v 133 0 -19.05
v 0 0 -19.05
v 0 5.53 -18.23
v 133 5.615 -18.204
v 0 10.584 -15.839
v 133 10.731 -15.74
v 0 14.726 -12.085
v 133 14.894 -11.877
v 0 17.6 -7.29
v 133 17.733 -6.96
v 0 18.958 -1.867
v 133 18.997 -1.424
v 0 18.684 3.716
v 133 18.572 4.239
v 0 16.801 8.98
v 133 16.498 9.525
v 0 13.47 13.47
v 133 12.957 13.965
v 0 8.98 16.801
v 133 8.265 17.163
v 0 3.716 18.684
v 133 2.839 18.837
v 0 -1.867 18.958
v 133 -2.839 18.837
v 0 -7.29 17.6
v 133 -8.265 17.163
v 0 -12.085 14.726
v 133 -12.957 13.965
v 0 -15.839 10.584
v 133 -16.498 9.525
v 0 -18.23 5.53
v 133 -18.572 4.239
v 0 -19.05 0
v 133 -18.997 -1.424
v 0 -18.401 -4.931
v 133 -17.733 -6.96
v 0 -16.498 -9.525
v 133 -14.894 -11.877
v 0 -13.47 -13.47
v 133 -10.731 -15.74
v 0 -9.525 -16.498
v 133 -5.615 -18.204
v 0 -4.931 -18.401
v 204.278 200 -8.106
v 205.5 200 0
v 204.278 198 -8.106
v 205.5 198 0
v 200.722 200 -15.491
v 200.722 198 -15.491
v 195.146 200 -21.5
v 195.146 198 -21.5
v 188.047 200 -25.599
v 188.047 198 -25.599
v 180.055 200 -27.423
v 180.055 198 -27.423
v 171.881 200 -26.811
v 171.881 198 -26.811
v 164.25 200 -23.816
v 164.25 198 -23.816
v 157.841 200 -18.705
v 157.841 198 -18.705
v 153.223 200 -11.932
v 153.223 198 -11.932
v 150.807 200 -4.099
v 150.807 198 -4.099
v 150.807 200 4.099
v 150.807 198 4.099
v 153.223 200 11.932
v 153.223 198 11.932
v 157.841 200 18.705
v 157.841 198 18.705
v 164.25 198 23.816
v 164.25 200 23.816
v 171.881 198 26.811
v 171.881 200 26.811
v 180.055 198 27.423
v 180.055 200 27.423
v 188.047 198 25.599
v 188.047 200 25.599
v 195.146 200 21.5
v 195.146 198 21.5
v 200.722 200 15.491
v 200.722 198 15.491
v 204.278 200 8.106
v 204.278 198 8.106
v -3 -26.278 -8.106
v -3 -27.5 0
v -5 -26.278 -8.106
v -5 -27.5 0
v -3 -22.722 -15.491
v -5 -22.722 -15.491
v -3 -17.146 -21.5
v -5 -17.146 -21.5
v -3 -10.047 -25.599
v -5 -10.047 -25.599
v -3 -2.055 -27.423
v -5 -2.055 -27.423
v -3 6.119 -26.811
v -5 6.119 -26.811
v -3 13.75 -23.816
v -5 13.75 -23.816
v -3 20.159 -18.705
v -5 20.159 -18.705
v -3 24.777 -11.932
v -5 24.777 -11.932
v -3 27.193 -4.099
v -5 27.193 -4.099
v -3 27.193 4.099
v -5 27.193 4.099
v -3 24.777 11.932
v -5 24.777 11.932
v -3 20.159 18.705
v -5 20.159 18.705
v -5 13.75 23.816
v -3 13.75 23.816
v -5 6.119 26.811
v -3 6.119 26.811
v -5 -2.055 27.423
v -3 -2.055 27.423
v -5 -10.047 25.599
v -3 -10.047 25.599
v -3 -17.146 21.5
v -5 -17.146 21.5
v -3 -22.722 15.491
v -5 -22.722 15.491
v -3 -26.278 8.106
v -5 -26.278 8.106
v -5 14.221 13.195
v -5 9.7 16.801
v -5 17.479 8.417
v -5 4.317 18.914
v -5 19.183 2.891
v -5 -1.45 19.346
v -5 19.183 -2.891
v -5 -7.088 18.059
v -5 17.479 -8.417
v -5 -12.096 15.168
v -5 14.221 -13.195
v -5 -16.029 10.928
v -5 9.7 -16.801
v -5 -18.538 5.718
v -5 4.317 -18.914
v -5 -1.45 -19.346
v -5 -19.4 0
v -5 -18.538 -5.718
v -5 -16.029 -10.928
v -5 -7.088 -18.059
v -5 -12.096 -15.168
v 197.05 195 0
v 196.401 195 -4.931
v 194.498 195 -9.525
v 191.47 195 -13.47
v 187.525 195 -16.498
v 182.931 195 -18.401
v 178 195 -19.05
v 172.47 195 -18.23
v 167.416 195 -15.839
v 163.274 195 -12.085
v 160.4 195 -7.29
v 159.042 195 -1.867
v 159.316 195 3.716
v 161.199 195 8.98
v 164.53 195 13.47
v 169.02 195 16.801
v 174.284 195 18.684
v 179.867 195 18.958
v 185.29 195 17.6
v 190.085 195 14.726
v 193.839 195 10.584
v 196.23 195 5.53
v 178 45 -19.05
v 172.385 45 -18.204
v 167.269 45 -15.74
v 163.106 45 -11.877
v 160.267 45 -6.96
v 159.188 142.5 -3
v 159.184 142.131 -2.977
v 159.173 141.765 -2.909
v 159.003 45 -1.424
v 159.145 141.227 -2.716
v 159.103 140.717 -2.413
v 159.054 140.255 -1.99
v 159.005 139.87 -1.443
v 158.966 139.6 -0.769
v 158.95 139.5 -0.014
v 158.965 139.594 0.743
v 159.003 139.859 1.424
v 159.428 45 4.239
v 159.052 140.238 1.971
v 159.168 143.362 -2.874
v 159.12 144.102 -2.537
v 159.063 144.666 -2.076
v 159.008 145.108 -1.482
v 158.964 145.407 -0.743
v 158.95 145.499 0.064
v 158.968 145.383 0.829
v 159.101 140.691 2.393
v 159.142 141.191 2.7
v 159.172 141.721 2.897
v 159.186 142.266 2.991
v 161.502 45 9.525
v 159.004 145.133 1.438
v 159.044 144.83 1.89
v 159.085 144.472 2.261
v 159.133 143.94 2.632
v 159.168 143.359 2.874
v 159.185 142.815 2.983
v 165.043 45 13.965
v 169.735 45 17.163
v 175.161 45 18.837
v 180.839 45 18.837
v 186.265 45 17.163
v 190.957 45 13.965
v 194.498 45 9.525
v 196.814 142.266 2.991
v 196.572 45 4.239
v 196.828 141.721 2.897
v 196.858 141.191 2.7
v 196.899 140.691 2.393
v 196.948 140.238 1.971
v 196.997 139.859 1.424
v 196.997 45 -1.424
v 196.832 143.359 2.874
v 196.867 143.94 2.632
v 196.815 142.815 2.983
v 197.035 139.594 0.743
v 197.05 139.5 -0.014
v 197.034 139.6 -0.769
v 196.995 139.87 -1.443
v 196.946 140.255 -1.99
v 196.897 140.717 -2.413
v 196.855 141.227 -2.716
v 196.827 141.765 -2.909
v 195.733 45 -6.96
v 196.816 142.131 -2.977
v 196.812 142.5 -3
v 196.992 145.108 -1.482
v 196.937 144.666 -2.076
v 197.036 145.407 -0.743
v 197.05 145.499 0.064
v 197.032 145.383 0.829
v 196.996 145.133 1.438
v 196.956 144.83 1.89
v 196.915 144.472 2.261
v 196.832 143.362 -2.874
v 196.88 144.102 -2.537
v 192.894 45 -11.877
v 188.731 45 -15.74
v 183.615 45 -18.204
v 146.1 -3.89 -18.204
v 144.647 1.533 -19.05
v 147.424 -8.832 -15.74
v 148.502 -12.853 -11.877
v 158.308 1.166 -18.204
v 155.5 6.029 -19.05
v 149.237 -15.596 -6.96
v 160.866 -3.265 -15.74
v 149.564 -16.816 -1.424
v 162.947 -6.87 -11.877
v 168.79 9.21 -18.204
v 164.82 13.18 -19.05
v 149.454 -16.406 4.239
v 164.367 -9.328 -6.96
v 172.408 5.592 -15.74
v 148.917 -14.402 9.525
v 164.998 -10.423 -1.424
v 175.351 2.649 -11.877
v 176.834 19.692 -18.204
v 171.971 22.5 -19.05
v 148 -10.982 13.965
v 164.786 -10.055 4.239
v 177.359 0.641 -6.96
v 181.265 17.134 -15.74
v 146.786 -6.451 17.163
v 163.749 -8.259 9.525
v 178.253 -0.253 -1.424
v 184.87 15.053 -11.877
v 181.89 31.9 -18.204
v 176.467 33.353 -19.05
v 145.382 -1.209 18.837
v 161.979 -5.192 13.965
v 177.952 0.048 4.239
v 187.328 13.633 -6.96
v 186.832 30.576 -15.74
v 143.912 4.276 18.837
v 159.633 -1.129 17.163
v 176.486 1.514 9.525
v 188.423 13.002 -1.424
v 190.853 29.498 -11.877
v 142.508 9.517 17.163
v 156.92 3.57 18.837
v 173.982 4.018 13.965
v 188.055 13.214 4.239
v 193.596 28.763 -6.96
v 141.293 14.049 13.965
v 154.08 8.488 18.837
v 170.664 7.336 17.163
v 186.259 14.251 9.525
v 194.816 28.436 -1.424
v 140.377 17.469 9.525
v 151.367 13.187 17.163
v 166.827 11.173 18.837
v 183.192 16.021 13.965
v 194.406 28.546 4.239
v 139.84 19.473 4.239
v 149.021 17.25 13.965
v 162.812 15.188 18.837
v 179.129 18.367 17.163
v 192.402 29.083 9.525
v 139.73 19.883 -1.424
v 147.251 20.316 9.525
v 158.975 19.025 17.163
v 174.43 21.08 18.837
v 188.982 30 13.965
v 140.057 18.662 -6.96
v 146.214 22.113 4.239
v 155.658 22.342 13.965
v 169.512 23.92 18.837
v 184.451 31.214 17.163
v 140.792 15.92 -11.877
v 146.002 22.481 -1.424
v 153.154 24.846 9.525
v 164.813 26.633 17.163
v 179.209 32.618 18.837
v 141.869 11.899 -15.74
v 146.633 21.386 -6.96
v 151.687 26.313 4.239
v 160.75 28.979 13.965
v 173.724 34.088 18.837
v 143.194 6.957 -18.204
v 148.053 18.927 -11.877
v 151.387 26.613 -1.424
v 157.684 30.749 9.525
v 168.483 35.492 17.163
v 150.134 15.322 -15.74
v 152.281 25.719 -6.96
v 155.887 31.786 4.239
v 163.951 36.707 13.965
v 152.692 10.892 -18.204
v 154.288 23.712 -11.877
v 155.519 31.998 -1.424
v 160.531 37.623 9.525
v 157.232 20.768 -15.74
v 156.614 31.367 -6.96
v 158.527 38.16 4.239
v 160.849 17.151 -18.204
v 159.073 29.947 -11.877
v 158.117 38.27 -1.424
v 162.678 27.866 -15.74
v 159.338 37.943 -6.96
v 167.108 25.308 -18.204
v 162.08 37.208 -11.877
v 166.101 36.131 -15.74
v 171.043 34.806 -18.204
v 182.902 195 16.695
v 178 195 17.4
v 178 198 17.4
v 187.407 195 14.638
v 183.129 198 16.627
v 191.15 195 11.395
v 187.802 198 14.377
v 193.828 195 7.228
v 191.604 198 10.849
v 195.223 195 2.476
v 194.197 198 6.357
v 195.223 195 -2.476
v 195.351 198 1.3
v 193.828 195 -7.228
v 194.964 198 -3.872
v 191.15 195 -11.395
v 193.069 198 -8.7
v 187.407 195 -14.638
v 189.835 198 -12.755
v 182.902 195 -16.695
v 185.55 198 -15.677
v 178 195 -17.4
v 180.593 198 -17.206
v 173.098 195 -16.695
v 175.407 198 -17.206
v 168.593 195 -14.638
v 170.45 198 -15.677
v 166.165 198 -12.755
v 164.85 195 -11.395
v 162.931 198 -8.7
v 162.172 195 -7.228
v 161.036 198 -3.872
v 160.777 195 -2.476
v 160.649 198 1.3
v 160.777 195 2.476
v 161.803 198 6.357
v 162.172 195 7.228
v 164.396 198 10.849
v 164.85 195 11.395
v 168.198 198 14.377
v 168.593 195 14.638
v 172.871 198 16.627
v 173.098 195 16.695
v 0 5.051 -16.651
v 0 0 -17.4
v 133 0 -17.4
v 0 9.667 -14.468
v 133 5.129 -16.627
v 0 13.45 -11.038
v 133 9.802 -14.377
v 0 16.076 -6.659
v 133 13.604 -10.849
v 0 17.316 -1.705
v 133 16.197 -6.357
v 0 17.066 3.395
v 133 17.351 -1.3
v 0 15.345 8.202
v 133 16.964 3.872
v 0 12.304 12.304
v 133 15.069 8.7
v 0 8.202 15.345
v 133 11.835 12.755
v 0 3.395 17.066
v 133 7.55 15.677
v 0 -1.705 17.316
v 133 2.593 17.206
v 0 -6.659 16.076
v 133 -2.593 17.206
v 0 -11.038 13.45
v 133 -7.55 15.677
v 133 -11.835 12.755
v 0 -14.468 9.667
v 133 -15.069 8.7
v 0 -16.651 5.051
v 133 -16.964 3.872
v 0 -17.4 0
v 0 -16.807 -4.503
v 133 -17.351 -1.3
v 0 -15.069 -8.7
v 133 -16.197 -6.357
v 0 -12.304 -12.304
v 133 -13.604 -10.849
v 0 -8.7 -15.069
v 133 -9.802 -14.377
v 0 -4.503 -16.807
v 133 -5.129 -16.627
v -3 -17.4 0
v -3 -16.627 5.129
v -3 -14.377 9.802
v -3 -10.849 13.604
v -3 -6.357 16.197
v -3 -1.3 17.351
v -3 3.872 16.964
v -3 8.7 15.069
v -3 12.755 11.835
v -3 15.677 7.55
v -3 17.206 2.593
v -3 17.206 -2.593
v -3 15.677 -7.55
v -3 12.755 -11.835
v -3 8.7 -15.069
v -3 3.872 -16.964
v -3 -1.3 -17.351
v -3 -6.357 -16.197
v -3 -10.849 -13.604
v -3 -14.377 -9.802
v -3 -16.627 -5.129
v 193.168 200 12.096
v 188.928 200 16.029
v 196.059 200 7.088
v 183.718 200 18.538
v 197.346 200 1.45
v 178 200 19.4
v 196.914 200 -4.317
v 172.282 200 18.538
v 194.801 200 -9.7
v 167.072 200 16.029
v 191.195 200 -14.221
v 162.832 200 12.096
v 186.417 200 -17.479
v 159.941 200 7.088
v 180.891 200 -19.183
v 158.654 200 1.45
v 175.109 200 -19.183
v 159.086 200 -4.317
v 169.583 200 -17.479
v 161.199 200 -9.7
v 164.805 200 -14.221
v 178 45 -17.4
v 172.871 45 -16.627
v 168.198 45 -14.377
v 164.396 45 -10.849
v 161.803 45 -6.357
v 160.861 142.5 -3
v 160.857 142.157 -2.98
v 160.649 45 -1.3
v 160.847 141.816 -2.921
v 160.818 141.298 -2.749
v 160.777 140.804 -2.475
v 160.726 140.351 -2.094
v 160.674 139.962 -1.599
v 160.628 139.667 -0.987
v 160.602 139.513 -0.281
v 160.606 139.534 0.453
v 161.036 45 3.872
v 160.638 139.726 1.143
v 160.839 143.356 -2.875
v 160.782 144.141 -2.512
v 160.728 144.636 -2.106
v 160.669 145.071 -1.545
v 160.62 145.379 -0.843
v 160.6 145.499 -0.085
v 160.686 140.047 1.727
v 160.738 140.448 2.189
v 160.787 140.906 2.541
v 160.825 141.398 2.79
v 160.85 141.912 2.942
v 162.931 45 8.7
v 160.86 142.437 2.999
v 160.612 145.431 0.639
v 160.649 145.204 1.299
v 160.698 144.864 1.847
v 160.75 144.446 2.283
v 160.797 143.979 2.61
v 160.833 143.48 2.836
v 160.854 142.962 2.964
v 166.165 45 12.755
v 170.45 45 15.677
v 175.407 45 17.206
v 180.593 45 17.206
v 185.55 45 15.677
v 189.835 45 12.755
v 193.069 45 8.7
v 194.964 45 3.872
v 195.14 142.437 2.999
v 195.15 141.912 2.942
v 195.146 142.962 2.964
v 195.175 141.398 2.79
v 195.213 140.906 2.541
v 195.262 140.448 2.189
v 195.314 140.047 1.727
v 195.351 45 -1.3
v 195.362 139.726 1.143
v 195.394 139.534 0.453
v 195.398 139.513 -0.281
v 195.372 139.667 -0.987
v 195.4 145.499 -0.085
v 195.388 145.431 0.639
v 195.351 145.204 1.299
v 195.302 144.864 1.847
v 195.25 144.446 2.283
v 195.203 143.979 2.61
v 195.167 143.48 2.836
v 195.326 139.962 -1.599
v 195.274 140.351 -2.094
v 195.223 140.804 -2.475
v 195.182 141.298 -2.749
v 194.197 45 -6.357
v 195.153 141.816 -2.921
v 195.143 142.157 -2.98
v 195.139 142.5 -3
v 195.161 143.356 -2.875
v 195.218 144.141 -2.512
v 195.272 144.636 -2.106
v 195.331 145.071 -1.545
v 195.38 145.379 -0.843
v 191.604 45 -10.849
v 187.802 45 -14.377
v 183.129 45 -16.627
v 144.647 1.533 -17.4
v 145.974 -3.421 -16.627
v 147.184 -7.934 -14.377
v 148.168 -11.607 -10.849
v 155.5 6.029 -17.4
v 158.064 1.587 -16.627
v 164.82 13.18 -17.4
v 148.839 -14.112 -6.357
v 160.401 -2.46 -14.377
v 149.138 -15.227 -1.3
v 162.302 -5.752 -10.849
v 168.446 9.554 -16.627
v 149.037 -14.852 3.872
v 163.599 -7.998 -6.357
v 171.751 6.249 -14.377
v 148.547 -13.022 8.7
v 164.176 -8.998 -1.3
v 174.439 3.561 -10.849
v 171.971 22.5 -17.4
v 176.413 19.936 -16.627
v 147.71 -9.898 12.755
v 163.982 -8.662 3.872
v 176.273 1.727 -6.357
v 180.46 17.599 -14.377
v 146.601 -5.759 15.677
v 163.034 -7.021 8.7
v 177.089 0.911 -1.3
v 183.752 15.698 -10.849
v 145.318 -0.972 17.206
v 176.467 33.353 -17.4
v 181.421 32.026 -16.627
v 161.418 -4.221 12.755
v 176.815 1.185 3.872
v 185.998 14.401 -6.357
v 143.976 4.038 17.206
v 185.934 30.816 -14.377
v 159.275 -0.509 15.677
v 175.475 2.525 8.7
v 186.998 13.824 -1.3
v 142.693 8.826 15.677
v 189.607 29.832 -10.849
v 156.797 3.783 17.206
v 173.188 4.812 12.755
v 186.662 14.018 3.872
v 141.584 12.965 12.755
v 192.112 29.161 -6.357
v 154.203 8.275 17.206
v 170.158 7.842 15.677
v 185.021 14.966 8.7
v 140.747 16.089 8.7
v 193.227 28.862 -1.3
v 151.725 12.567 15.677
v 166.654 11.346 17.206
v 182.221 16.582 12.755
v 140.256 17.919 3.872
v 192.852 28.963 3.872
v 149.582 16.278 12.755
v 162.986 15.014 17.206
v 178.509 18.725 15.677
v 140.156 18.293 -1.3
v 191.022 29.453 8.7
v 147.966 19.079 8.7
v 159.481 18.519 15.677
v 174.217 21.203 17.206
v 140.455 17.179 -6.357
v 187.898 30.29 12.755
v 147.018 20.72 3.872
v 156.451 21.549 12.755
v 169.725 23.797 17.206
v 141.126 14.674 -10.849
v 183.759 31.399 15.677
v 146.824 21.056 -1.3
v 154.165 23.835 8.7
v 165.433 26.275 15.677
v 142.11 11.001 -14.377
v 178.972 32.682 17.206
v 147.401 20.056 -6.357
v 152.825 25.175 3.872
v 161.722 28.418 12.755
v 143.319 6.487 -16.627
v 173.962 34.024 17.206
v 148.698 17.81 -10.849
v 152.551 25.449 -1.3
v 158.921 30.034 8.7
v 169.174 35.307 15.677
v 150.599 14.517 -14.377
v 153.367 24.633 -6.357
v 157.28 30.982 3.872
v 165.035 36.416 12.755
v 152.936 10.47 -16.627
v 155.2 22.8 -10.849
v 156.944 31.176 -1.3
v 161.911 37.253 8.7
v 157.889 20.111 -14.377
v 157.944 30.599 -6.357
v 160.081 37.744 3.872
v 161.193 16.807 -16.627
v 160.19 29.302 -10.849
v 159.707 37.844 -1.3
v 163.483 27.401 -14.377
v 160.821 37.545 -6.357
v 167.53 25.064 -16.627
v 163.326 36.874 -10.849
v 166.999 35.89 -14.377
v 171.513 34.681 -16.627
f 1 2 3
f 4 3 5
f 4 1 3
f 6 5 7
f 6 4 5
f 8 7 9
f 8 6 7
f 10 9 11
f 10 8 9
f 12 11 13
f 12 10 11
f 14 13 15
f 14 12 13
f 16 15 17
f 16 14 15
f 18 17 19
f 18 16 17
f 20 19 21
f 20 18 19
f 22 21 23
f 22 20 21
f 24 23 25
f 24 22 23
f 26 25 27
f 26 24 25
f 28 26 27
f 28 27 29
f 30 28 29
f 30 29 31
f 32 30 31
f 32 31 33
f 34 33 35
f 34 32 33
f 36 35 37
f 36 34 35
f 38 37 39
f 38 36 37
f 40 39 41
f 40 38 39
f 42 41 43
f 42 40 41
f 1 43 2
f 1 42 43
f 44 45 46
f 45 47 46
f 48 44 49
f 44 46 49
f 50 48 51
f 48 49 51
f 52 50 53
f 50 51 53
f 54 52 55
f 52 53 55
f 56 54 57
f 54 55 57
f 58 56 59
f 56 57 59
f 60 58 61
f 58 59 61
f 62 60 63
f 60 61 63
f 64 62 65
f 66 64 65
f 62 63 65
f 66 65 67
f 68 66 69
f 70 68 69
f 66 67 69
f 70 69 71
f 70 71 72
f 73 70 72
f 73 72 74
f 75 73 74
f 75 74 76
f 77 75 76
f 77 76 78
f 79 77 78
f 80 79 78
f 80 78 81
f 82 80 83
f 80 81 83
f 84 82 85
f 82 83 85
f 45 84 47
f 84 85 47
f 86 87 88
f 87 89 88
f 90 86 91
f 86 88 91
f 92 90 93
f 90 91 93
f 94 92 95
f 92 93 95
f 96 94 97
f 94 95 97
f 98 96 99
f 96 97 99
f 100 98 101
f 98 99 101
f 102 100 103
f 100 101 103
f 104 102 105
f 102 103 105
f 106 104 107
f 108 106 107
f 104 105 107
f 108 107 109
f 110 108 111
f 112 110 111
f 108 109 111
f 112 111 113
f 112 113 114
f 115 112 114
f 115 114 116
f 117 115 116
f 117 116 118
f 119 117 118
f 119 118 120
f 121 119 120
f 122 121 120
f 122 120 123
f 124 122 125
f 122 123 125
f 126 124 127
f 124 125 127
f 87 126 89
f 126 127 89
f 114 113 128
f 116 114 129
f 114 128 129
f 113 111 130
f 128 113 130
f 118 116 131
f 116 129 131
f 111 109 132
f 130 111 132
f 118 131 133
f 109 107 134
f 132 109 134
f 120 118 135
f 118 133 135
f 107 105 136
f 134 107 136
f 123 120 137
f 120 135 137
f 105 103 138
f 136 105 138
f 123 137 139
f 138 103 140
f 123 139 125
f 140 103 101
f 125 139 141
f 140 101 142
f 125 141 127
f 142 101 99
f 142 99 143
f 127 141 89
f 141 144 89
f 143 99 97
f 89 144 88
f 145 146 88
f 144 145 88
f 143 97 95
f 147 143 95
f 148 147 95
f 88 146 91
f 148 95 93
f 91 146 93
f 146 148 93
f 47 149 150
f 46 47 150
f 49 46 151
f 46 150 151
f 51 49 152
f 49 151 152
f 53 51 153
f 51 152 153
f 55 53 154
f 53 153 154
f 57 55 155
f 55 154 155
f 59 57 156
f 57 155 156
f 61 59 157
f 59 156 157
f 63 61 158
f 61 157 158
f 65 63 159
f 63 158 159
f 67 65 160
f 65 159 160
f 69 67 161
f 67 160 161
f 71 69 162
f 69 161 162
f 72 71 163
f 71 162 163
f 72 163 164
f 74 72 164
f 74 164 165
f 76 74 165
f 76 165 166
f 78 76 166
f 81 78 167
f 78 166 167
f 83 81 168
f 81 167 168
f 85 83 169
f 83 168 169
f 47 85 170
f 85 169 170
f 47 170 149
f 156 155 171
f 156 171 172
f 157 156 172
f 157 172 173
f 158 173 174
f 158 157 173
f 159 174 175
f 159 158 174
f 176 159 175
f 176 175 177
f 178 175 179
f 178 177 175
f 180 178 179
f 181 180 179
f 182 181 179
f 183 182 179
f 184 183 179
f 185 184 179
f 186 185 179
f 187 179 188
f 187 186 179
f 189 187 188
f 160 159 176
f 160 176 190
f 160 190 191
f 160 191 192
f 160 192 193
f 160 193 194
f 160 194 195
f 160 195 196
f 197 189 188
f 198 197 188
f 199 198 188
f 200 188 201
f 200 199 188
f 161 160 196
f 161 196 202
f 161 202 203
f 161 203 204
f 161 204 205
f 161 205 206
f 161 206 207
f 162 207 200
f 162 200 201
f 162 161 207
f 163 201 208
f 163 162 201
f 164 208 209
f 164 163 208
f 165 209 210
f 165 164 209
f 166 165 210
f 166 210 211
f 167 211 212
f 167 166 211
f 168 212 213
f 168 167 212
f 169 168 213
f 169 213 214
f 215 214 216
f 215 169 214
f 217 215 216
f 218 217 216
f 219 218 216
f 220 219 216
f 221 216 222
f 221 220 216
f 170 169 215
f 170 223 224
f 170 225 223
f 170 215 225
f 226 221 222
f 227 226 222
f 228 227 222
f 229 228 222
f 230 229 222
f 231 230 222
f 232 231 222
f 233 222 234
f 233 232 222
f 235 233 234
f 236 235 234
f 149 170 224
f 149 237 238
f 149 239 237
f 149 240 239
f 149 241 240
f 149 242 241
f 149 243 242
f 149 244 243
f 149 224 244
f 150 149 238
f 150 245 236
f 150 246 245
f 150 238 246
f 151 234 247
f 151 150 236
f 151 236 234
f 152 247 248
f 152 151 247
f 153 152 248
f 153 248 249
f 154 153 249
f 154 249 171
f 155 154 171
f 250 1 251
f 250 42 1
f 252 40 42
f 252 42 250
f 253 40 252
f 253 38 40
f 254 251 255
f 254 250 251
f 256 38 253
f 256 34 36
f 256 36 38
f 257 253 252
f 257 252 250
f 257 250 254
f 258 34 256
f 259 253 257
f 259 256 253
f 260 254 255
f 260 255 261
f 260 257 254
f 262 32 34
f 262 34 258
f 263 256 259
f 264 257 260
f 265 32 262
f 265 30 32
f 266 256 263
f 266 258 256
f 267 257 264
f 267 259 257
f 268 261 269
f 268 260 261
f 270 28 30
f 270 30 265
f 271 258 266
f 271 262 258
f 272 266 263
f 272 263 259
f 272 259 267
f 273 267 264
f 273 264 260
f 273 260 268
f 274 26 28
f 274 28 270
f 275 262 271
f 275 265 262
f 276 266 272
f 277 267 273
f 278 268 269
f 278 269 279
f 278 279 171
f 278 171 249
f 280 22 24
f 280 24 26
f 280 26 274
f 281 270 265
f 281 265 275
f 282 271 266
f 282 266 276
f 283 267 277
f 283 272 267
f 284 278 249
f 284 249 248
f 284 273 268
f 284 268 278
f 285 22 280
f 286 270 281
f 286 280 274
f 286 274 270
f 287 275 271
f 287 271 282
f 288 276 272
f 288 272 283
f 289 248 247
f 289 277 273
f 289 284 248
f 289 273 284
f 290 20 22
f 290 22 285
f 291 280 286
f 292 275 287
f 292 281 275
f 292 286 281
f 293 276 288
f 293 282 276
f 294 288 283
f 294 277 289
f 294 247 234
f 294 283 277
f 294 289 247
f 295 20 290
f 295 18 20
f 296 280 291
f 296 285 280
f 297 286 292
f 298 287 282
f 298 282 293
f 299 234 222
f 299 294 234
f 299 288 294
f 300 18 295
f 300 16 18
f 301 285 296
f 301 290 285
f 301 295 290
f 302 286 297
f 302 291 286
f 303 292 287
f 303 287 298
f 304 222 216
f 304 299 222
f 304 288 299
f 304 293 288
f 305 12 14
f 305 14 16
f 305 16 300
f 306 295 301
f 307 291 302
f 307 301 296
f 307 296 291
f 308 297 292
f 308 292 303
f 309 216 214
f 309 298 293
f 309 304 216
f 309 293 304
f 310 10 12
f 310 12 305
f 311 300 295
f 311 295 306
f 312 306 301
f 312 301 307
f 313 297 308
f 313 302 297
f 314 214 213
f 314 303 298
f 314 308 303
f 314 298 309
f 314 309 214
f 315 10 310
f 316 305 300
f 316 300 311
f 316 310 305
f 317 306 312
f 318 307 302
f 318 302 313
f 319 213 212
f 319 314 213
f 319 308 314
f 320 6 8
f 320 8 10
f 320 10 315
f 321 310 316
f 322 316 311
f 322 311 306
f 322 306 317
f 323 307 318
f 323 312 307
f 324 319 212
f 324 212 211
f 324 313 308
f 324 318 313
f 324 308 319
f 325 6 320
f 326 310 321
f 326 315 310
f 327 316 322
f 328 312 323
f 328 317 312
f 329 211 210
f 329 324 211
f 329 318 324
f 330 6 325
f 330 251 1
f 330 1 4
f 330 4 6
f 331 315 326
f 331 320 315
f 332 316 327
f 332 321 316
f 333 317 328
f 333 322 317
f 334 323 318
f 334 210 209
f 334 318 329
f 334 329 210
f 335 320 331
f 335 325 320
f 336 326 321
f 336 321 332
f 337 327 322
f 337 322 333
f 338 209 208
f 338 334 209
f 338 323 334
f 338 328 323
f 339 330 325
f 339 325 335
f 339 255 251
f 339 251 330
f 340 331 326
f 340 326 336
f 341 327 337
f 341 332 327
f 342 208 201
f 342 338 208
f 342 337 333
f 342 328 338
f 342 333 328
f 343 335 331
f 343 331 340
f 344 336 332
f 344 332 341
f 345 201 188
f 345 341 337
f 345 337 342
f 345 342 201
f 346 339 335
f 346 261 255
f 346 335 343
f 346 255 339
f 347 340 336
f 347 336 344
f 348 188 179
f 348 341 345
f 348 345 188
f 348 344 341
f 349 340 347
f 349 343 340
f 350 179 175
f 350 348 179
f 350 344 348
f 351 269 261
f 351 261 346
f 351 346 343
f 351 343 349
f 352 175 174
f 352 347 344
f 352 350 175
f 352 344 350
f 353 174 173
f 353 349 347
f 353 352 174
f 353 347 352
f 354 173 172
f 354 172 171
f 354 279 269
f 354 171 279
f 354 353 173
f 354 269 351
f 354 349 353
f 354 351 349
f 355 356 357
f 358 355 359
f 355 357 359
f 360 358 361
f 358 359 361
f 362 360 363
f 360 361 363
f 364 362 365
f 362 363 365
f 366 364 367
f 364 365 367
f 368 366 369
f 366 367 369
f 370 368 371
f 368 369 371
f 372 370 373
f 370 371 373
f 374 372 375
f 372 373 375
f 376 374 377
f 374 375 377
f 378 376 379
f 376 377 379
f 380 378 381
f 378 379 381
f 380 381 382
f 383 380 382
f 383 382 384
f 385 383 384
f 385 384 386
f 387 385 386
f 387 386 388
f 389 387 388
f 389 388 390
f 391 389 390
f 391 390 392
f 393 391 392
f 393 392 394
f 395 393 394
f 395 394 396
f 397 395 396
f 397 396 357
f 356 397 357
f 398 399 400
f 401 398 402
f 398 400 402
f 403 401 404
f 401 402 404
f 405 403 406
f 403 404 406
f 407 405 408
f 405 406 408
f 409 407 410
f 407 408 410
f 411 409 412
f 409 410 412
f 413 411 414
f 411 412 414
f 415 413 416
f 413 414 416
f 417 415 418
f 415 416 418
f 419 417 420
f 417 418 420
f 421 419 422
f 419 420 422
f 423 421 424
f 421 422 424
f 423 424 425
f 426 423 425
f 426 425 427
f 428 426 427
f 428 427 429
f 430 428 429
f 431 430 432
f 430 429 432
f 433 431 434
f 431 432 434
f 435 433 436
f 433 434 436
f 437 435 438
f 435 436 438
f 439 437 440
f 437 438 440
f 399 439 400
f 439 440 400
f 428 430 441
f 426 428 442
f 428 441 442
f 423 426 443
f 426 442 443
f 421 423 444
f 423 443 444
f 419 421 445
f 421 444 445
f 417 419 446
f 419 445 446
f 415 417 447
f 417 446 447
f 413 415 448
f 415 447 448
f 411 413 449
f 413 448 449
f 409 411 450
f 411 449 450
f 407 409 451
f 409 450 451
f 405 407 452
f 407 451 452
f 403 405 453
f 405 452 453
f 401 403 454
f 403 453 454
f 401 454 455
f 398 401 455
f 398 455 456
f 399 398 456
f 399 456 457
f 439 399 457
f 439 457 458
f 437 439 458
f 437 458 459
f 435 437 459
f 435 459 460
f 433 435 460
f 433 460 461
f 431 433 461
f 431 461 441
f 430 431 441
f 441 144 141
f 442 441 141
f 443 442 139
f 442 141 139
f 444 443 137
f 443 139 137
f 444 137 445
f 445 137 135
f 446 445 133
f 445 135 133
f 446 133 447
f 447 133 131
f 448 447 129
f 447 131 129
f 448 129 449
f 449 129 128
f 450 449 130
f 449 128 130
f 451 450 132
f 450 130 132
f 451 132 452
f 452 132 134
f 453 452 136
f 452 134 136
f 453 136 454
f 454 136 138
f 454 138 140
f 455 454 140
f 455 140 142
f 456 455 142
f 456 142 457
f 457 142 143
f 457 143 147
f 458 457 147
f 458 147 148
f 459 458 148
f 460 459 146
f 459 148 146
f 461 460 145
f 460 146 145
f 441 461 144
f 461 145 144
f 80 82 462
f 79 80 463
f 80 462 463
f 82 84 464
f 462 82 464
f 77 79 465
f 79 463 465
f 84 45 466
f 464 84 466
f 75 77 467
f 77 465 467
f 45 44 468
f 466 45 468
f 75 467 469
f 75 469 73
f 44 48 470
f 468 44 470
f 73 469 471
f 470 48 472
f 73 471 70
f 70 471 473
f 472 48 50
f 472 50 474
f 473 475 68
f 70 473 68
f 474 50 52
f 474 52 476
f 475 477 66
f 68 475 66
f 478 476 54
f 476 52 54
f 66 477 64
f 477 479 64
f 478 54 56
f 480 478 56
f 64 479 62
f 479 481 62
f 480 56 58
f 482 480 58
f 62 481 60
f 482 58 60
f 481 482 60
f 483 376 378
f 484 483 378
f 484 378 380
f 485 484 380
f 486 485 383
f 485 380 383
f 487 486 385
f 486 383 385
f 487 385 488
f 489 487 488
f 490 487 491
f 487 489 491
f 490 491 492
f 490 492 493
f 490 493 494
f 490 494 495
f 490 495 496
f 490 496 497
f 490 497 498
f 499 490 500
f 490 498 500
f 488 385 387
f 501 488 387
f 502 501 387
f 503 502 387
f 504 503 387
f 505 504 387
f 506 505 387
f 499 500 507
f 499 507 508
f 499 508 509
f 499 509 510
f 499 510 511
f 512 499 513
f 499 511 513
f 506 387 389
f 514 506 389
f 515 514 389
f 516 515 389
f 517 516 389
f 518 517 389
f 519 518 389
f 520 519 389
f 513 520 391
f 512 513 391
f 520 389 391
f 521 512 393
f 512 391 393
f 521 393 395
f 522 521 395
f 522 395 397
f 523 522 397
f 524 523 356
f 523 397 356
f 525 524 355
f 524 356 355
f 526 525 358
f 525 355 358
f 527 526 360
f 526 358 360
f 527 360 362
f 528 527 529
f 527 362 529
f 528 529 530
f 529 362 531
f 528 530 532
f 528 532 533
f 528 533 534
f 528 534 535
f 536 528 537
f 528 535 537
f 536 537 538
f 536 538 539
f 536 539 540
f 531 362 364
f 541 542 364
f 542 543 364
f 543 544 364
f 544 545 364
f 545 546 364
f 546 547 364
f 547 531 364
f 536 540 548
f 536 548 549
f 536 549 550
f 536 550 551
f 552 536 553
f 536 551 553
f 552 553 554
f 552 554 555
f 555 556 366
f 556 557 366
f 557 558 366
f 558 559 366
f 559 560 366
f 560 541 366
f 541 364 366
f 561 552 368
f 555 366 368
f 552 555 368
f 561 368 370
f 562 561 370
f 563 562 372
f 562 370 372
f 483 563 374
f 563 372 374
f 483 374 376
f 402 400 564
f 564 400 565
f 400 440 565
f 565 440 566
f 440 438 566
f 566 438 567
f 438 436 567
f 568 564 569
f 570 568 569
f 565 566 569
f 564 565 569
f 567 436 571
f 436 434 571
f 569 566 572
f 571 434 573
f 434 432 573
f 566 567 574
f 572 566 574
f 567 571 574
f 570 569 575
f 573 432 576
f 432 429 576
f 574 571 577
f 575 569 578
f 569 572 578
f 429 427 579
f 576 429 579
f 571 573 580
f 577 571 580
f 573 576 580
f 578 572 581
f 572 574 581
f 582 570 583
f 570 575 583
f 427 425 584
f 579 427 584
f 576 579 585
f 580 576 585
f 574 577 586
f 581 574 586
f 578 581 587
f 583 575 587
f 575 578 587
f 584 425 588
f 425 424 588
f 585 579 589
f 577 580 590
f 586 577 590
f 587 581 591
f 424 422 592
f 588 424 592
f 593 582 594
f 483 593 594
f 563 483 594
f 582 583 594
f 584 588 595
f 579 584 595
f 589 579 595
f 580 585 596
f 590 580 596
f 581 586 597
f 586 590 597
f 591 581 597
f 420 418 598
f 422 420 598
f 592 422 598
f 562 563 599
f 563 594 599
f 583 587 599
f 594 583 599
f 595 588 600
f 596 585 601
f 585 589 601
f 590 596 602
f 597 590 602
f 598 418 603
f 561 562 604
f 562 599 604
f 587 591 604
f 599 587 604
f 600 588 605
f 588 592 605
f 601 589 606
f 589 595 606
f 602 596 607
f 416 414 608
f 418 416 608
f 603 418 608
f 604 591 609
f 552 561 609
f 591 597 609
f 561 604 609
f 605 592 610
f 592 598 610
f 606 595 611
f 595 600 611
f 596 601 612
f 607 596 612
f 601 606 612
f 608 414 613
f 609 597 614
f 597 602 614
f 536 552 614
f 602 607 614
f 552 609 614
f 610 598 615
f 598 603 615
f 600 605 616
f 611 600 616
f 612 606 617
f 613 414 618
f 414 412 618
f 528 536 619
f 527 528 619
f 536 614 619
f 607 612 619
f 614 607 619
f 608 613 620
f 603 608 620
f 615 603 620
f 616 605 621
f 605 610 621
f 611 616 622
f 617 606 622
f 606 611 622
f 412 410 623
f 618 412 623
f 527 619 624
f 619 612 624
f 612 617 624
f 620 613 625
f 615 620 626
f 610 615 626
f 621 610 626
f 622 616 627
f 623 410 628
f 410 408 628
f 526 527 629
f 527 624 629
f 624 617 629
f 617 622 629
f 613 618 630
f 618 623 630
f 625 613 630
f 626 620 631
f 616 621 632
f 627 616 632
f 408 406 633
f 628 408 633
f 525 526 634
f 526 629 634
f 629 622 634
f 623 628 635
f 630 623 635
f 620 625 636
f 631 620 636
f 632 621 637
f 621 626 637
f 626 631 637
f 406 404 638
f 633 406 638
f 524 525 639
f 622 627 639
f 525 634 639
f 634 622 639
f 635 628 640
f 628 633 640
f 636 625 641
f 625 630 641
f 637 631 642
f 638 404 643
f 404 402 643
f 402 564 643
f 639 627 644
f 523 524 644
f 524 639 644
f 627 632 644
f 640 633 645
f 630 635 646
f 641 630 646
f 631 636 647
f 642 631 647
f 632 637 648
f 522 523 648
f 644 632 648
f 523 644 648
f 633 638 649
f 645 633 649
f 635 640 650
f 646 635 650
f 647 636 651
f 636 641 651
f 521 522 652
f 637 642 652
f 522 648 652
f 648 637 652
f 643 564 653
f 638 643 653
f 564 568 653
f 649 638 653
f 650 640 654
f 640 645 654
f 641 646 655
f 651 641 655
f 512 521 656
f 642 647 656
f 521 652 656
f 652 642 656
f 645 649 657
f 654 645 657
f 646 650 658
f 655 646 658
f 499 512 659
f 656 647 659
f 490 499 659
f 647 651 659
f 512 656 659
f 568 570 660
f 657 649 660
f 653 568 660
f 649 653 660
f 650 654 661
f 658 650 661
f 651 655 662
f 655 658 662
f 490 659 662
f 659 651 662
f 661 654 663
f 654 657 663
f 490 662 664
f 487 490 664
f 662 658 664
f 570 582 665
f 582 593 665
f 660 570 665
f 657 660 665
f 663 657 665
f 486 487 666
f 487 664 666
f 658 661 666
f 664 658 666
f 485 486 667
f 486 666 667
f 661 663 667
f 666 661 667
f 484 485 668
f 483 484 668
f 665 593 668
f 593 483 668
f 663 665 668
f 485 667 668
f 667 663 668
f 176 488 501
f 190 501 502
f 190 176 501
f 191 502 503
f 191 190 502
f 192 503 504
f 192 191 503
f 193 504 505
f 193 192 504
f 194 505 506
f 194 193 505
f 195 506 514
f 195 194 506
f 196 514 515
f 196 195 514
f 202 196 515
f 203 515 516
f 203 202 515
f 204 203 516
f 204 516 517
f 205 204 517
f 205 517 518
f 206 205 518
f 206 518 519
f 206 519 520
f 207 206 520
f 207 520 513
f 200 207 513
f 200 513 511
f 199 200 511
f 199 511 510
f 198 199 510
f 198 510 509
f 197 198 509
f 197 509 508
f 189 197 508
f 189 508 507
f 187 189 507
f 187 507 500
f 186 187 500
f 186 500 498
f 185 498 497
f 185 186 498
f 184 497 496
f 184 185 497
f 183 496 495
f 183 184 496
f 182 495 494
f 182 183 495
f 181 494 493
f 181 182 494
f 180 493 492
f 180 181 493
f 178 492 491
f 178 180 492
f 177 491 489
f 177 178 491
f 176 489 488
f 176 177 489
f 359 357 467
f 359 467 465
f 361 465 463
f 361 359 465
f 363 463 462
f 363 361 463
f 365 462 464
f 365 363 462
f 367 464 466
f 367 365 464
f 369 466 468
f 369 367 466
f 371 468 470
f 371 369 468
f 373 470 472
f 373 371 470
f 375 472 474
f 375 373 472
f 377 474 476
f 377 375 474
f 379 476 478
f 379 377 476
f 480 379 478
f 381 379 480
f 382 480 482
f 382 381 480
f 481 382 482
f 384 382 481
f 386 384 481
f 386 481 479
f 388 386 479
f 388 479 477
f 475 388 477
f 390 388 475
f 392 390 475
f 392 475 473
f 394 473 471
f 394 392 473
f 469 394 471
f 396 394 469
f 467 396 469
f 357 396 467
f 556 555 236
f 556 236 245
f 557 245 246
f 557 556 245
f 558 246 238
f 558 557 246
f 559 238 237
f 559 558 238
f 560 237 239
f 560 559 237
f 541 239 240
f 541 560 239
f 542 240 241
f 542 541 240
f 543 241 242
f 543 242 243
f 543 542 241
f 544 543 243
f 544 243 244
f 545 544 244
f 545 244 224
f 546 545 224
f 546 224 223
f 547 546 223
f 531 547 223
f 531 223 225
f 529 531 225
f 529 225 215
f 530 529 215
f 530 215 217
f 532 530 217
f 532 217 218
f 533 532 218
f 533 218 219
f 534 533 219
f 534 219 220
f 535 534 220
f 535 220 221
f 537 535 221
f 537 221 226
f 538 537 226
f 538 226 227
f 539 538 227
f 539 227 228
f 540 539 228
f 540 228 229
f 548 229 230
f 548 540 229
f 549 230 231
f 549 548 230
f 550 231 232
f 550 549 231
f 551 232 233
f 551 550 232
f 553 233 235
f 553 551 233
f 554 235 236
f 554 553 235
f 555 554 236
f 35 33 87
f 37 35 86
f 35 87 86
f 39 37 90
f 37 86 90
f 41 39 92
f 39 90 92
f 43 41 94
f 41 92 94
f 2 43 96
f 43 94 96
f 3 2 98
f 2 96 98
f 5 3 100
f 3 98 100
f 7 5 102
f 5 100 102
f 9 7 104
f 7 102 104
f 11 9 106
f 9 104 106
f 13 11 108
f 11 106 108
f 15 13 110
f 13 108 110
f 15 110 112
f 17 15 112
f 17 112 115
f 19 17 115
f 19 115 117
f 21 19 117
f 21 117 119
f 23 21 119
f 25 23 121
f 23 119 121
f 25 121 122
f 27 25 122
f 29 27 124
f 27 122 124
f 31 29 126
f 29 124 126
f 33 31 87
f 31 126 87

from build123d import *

# Parameters (mm, degrees)
SKETCH_2_R               = 19.05
SKETCH_2_R_2             = 17.4
SKETCH_2_2_R             = 19.05
SKETCH_2_2_R_2           = 17.4
CUT_EXTRUDE_1_REACH      = 293.662
SKETCH_6_R               = 17.4
CUT_EXTRUDE_2_REACH      = 309.803
SKETCH_7_R               = 17.4
CHAMFER_1_SIZE           = 2
CUT_EXTRUDE_3_DEPTH      = 289.073775273
CUT_EXTRUDE_3_DEPTH_BACK = 289.073775273
SKETCH_8_R               = 3


with BuildPart() as part:
    # 스윕1: sweep along a path in 스케치1
    with BuildLine(Plane.XY) as sweep_1_path:
        Line((0, 0), (133, 0))
        ThreePointArc((133, 0), (164.819805153, 13.180194847), (178, 45))
        Line((178, 45), (178, 195))
    # 스케치2 → 스윕1 (sweep)
    with BuildSketch(Plane(origin=(0, 0, 0), x_dir=(0, 0, -1), z_dir=(1, 0, 0))):
        Circle(SKETCH_2_R)
        Circle(SKETCH_2_R_2, mode=Mode.SUBTRACT)
    sweep(path=sweep_1_path.line)



with BuildPart() as body_2:
    # 스윕2: sweep along a path in 스케치1<2>
    with BuildLine(Plane.XY) as sweep_2_path:
        Line((0, 0), (133, 0))
        ThreePointArc((133, 0), (164.819805153, 13.180194847), (178, 45))
        Line((178, 45), (178, 195))
    # 스케치2<2> → 스윕2 (sweep)
    with BuildSketch(Plane(origin=(0, 0, 0), x_dir=(0, 0, -1), z_dir=(1, 0, 0))):
        Circle(SKETCH_2_2_R)
        Circle(SKETCH_2_2_R_2, mode=Mode.SUBTRACT)
    sweep(path=sweep_2_path.line)


with BuildPart() as part_1:
    add(part.part)

    add(body_2.part)  # 회전1 merges body 2
    # 스케치4 → 회전1 (revolve)
    with BuildSketch(Plane.XY, mode=Mode.PRIVATE) as revolve_1_sk:
        Polygon((0, 0), (0, 19.05), (-3, 27.5), (-5, 27.5), (-5, 0), align=None)
    revolve(revolve_1_sk.sketch.rotate(Axis((-5, 0, 0), (1, 0, 0)), 180), axis=Axis((-5, 0, 0), (1, 0, 0)))

    # 스케치5 → 회전2 (revolve)
    with BuildSketch(Plane.XY):
        Polygon((178, 195), (178, 200), (205.5, 200), (205.5, 198), (197.05, 195), align=None)
    revolve(axis=Axis((178, 195, 0), (0, 1, 0)))

    # 스케치6 → 컷-돌출1 (cut, up to next)
    with BuildSketch(Plane.ZY.offset(5), mode=Mode.PRIVATE) as cut_extrude_1_sk1:
        with Locations(Location((0, 0, 0), (0, 0, 270))):
            Circle(SKETCH_6_R)
    cut_extrude_1_tool1 = extrude(cut_extrude_1_sk1.sketch, amount=-CUT_EXTRUDE_1_REACH, mode=Mode.PRIVATE) & part_1.part
    add(cut_extrude_1_tool1.solids().sort_by_distance((-5, 0, 0))[0], mode=Mode.SUBTRACT)

    # 스케치7 → 컷-돌출2 (cut, up to next)
    with BuildSketch(Plane(origin=(0, 200, 0), x_dir=(1, 0, 0), z_dir=(0, 1, 0)), mode=Mode.PRIVATE) as cut_extrude_2_sk1:
        with Locations(Location((178, 0, 0), (0, 0, 270))):
            Circle(SKETCH_7_R)
    cut_extrude_2_tool1 = extrude(cut_extrude_2_sk1.sketch, amount=-CUT_EXTRUDE_2_REACH, mode=Mode.PRIVATE) & part_1.part
    add(cut_extrude_2_tool1.solids().sort_by_distance((178, 200, 0))[0], mode=Mode.SUBTRACT)

    # 모따기1
    chamfer_1_edges = [part_1.edges().sort_by_distance(p)[0] for p in [
        (-5, 17.4, 0),
        (178, 200, -17.4),
    ]]
    chamfer(chamfer_1_edges, length=CHAMFER_1_SIZE)

    # 스케치8 → 컷-돌출3 (cut, two sides: drawn at the far end of the back side and taken through both)
    with BuildSketch(Plane(origin=(0, 0, 0), x_dir=(0, 0, -1), z_dir=(1, 0, 0)).offset(-CUT_EXTRUDE_3_DEPTH_BACK)):
        with Locations((0, 142.5)):
            Circle(SKETCH_8_R)
    extrude(amount=CUT_EXTRUDE_3_DEPTH + CUT_EXTRUDE_3_DEPTH_BACK, mode=Mode.SUBTRACT)


solid = part_1.part
